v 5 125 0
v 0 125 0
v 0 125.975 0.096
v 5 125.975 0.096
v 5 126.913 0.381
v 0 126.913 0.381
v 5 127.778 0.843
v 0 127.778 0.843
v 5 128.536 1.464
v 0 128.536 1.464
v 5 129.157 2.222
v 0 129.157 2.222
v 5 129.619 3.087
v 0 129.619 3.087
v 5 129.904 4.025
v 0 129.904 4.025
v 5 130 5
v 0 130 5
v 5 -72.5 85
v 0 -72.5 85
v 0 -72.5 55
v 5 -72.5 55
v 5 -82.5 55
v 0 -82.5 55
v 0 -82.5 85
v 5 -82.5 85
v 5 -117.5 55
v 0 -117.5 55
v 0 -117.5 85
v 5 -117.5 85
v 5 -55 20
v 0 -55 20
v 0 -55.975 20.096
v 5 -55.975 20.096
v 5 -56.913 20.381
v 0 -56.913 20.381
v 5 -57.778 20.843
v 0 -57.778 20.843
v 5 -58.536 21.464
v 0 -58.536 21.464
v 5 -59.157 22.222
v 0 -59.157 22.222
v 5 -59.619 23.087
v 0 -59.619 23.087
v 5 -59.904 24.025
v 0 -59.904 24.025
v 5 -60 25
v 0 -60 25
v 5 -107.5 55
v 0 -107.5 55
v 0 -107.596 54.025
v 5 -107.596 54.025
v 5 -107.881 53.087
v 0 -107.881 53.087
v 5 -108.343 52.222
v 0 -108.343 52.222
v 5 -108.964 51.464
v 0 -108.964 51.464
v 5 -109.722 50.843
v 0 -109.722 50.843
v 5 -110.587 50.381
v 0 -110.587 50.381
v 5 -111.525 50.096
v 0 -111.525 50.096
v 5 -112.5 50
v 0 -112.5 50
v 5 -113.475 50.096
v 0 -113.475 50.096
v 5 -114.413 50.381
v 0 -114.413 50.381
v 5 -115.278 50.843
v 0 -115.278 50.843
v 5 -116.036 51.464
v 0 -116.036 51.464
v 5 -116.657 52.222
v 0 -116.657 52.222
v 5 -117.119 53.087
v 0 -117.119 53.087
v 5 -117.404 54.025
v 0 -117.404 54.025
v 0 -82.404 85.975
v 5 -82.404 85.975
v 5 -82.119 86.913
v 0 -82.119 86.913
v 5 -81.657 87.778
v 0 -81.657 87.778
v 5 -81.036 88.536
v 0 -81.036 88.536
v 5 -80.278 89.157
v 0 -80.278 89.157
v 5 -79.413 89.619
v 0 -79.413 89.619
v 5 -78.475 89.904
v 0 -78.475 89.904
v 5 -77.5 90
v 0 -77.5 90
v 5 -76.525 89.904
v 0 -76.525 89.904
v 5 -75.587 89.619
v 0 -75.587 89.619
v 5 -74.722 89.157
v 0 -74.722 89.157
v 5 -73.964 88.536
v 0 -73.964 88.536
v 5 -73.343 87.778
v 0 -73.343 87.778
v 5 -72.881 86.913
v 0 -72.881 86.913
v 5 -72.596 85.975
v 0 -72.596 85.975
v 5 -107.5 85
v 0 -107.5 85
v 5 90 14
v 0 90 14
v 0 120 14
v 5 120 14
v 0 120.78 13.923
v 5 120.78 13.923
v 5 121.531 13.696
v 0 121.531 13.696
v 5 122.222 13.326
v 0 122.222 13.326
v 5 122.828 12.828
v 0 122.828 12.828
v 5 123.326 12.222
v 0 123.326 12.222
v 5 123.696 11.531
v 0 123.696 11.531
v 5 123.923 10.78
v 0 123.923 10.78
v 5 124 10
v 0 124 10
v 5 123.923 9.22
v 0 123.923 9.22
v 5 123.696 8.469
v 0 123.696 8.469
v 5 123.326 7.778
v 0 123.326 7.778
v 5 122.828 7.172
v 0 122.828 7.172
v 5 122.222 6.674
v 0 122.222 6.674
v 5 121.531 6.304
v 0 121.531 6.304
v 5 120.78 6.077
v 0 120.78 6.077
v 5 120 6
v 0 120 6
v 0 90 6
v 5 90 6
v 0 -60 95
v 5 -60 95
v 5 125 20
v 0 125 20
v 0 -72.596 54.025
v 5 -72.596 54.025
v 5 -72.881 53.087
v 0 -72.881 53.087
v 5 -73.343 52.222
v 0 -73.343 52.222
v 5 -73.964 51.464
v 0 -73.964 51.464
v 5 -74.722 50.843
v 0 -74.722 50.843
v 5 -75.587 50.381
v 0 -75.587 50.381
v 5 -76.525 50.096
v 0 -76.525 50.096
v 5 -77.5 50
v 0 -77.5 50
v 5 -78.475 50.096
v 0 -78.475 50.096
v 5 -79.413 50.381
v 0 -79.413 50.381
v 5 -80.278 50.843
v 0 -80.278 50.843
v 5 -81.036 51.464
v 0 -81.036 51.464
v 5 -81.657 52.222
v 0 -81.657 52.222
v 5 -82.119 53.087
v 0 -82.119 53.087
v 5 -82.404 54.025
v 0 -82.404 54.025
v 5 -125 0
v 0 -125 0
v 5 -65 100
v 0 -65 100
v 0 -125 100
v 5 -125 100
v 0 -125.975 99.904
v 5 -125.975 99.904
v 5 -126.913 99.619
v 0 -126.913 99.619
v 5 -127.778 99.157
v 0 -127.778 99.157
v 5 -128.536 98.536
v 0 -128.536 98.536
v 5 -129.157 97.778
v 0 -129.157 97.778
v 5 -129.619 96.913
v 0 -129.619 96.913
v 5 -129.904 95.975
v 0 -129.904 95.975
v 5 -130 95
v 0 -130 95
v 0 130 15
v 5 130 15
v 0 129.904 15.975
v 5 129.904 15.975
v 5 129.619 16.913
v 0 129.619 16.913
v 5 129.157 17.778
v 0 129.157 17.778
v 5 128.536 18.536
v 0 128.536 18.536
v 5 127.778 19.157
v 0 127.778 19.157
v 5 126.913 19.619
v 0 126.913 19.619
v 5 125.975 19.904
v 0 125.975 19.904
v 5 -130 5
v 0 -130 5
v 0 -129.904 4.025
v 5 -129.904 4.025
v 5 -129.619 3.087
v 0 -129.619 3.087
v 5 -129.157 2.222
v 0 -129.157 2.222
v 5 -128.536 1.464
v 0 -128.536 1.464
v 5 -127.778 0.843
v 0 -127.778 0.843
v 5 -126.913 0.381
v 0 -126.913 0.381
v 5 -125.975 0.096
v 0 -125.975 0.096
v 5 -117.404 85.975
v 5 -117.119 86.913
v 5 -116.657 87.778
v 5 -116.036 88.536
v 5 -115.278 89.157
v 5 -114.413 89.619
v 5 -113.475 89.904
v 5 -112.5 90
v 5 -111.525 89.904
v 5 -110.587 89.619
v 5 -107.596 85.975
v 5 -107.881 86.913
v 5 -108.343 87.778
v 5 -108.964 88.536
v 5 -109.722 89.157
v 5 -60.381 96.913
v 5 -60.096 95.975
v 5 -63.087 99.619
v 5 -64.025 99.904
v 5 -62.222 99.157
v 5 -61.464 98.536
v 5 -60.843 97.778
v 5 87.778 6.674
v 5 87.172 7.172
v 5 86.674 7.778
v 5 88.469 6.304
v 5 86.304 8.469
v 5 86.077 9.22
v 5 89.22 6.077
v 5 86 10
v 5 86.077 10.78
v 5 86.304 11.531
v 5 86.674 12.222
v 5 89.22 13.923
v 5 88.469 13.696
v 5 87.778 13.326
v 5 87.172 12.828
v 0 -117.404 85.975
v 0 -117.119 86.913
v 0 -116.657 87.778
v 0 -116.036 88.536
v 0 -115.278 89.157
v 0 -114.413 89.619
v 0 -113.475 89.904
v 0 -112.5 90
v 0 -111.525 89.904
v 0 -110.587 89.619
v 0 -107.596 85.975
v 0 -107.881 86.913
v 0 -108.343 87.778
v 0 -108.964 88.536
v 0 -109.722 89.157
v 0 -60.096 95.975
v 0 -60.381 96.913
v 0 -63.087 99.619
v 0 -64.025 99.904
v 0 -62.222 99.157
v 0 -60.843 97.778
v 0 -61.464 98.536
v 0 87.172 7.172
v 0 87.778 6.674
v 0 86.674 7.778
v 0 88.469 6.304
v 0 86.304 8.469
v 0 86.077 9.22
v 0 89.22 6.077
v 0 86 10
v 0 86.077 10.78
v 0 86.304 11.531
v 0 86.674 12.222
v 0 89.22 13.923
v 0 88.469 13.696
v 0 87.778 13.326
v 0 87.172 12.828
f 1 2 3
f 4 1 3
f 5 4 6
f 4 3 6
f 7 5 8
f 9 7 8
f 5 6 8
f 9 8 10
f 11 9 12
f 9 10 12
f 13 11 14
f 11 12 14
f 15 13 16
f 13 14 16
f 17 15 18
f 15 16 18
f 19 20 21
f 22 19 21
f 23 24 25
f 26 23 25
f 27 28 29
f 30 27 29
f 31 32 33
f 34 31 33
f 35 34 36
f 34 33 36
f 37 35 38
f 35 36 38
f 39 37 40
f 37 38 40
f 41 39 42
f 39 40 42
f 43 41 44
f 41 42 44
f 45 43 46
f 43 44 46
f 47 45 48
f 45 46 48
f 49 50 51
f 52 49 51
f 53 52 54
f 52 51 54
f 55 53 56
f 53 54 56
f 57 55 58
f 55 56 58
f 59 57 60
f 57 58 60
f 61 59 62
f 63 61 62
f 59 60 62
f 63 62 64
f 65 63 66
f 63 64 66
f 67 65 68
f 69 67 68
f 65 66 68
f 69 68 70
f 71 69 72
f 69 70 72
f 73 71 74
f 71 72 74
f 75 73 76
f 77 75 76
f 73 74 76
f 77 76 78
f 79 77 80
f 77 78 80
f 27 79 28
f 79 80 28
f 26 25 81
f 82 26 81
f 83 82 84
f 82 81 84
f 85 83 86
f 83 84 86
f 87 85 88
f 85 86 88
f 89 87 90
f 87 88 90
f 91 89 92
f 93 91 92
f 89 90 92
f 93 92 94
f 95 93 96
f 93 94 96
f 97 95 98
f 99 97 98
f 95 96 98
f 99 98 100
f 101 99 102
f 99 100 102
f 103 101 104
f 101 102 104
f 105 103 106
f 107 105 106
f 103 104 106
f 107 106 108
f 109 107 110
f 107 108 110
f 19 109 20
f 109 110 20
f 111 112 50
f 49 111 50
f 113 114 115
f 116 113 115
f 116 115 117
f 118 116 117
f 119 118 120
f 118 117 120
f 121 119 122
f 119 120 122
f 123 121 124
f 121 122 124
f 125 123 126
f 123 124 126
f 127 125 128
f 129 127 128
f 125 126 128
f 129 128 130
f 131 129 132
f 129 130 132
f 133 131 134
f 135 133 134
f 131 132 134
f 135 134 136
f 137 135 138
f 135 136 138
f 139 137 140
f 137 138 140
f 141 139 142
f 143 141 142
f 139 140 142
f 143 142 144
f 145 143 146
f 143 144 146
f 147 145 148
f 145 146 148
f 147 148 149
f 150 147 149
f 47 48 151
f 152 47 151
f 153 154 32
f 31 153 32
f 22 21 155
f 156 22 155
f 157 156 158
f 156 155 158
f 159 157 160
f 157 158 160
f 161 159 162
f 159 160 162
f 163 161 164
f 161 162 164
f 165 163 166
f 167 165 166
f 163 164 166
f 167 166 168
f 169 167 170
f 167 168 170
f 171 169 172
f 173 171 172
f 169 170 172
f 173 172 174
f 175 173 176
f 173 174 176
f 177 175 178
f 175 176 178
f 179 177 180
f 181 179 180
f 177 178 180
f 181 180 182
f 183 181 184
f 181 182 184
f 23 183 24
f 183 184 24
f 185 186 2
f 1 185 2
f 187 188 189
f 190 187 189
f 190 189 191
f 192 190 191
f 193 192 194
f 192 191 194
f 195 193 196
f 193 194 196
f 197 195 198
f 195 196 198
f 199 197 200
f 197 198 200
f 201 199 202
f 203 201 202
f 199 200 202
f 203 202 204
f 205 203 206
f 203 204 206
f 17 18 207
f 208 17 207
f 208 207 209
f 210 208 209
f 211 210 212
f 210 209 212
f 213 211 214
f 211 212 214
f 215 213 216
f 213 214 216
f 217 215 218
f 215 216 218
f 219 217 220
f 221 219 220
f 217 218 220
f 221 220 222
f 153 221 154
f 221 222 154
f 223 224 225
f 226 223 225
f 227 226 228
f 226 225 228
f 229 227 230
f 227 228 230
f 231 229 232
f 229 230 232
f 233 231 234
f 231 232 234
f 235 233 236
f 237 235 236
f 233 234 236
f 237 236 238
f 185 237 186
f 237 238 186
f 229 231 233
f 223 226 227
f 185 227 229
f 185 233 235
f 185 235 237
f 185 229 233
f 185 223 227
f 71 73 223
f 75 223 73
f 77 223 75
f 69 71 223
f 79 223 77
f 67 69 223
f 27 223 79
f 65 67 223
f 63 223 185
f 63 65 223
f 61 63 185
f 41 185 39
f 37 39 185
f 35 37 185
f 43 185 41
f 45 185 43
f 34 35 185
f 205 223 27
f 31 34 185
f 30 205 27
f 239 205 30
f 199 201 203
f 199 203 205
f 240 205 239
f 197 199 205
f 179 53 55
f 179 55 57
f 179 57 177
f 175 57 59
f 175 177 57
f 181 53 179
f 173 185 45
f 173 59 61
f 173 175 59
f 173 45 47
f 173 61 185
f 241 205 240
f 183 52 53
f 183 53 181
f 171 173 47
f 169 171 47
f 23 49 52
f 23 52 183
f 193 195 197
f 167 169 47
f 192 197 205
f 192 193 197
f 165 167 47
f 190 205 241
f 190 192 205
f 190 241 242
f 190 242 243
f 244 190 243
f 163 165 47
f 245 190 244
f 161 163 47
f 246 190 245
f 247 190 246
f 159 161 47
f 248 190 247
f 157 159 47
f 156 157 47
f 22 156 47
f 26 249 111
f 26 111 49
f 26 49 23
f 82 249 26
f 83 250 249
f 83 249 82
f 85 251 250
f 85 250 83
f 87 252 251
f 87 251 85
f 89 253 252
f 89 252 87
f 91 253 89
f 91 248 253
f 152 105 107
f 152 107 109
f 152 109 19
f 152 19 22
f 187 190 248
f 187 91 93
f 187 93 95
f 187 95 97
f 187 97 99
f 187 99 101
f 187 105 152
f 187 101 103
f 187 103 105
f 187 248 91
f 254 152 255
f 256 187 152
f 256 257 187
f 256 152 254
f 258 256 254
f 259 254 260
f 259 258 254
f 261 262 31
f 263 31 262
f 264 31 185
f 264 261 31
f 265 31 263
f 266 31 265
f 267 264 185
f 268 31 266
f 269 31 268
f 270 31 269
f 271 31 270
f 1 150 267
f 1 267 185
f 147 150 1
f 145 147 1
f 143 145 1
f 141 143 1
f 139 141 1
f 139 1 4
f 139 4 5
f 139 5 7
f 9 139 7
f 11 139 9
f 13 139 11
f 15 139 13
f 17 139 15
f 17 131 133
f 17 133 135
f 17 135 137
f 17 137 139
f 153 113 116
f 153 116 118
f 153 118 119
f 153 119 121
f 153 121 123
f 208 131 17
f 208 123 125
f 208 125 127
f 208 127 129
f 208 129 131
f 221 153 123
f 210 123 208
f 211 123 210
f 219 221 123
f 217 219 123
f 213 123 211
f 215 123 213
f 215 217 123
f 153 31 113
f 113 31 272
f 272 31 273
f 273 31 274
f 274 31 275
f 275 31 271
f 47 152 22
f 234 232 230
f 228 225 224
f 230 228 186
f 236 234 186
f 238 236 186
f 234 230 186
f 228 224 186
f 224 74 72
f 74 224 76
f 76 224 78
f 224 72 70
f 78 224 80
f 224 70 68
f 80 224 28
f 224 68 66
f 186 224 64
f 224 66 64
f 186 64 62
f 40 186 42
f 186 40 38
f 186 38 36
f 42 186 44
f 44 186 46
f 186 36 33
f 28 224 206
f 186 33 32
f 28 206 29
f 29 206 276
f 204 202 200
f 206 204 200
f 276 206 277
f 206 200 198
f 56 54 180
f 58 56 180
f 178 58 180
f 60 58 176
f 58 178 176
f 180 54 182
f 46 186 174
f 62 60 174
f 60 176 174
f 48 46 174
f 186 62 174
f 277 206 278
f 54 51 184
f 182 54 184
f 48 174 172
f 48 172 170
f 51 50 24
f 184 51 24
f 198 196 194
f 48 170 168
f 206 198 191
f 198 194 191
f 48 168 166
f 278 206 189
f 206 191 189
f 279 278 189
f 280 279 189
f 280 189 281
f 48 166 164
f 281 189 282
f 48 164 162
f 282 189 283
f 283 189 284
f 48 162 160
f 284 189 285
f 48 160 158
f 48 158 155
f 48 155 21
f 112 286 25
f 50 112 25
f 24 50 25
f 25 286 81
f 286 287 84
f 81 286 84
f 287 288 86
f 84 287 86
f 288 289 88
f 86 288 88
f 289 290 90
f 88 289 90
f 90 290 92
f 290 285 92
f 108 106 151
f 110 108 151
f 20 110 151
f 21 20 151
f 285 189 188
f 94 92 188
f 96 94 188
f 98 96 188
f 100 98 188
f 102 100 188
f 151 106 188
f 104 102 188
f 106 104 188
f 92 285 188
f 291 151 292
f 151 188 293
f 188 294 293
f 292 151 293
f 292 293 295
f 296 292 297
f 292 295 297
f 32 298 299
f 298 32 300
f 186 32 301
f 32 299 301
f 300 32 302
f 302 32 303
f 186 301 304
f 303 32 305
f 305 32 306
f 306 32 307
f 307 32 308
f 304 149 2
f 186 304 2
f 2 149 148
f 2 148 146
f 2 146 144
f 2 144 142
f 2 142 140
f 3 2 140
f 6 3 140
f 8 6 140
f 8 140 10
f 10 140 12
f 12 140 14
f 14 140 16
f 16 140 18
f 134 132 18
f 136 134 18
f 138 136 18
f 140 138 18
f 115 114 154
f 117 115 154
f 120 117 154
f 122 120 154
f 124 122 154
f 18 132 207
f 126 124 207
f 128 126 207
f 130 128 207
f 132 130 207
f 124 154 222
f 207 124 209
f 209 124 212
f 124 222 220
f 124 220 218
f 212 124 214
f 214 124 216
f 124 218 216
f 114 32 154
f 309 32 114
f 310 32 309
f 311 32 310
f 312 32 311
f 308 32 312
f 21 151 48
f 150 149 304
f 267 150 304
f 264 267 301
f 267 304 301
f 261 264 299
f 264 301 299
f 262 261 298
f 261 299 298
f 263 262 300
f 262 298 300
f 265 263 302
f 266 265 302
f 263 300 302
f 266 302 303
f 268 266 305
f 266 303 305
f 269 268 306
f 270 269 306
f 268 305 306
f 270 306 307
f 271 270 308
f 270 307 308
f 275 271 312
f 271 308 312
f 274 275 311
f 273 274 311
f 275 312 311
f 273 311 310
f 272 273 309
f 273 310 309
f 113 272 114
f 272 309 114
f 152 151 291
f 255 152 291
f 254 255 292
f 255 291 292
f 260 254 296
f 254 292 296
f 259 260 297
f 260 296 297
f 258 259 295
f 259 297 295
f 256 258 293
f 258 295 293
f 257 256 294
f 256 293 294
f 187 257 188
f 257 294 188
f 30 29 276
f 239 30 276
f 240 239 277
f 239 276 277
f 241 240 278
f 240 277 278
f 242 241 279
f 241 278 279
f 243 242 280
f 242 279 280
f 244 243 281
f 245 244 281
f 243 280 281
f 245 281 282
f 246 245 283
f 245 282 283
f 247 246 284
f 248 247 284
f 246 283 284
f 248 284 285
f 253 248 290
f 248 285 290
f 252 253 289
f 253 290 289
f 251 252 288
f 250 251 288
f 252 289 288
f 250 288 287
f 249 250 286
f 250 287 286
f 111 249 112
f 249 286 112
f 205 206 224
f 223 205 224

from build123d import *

# Parameters (mm, degrees)
F1_DEPTH = 5


with BuildPart() as f1:
    # F0 (on Right) → F1 (new body)
    with BuildSketch(Plane.YZ):
        with BuildLine():
            ThreePointArc((-125, 100), (-128.535534, 98.535534), (-130, 95))
            Line((-130, 95), (-130, 5))
            ThreePointArc((-130, 5), (-128.535534, 1.464466), (-125, 0))
            Line((-125, 0), (125, 0))
            ThreePointArc((125, 0), (128.535534, 1.464466), (130, 5))
            Line((130, 5), (130, 15))
            ThreePointArc((130, 15), (128.535534, 18.535534), (125, 20))
            Line((125, 20), (-55, 20))
            ThreePointArc((-55, 20), (-58.535534, 21.464466), (-60, 25))
            Line((-60, 25), (-60, 95))
            ThreePointArc((-60, 95), (-61.464466, 98.535534), (-65, 100))
            Line((-65, 100), (-125, 100))
        make_face()
        with BuildLine():
            Line((90, 14), (120, 14))
            ThreePointArc((120, 14), (124, 10), (120, 6))
            Line((120, 6), (90, 6))
            ThreePointArc((90, 6), (86, 10), (90, 14))
        make_face(mode=Mode.SUBTRACT)
        with BuildLine():
            ThreePointArc((-117.5, 85), (-112.5, 90), (-107.5, 85))
            Line((-107.5, 85), (-107.5, 55))
            ThreePointArc((-107.5, 55), (-112.5, 50), (-117.5, 55))
            Line((-117.5, 55), (-117.5, 85))
        make_face(mode=Mode.SUBTRACT)
        with BuildLine():
            ThreePointArc((-82.5, 85), (-77.5, 90), (-72.5, 85))
            Line((-72.5, 85), (-72.5, 55))
            ThreePointArc((-72.5, 55), (-77.5, 50), (-82.5, 55))
            Line((-82.5, 55), (-82.5, 85))
        make_face(mode=Mode.SUBTRACT)
    extrude(amount=F1_DEPTH)


solid = f1.part
